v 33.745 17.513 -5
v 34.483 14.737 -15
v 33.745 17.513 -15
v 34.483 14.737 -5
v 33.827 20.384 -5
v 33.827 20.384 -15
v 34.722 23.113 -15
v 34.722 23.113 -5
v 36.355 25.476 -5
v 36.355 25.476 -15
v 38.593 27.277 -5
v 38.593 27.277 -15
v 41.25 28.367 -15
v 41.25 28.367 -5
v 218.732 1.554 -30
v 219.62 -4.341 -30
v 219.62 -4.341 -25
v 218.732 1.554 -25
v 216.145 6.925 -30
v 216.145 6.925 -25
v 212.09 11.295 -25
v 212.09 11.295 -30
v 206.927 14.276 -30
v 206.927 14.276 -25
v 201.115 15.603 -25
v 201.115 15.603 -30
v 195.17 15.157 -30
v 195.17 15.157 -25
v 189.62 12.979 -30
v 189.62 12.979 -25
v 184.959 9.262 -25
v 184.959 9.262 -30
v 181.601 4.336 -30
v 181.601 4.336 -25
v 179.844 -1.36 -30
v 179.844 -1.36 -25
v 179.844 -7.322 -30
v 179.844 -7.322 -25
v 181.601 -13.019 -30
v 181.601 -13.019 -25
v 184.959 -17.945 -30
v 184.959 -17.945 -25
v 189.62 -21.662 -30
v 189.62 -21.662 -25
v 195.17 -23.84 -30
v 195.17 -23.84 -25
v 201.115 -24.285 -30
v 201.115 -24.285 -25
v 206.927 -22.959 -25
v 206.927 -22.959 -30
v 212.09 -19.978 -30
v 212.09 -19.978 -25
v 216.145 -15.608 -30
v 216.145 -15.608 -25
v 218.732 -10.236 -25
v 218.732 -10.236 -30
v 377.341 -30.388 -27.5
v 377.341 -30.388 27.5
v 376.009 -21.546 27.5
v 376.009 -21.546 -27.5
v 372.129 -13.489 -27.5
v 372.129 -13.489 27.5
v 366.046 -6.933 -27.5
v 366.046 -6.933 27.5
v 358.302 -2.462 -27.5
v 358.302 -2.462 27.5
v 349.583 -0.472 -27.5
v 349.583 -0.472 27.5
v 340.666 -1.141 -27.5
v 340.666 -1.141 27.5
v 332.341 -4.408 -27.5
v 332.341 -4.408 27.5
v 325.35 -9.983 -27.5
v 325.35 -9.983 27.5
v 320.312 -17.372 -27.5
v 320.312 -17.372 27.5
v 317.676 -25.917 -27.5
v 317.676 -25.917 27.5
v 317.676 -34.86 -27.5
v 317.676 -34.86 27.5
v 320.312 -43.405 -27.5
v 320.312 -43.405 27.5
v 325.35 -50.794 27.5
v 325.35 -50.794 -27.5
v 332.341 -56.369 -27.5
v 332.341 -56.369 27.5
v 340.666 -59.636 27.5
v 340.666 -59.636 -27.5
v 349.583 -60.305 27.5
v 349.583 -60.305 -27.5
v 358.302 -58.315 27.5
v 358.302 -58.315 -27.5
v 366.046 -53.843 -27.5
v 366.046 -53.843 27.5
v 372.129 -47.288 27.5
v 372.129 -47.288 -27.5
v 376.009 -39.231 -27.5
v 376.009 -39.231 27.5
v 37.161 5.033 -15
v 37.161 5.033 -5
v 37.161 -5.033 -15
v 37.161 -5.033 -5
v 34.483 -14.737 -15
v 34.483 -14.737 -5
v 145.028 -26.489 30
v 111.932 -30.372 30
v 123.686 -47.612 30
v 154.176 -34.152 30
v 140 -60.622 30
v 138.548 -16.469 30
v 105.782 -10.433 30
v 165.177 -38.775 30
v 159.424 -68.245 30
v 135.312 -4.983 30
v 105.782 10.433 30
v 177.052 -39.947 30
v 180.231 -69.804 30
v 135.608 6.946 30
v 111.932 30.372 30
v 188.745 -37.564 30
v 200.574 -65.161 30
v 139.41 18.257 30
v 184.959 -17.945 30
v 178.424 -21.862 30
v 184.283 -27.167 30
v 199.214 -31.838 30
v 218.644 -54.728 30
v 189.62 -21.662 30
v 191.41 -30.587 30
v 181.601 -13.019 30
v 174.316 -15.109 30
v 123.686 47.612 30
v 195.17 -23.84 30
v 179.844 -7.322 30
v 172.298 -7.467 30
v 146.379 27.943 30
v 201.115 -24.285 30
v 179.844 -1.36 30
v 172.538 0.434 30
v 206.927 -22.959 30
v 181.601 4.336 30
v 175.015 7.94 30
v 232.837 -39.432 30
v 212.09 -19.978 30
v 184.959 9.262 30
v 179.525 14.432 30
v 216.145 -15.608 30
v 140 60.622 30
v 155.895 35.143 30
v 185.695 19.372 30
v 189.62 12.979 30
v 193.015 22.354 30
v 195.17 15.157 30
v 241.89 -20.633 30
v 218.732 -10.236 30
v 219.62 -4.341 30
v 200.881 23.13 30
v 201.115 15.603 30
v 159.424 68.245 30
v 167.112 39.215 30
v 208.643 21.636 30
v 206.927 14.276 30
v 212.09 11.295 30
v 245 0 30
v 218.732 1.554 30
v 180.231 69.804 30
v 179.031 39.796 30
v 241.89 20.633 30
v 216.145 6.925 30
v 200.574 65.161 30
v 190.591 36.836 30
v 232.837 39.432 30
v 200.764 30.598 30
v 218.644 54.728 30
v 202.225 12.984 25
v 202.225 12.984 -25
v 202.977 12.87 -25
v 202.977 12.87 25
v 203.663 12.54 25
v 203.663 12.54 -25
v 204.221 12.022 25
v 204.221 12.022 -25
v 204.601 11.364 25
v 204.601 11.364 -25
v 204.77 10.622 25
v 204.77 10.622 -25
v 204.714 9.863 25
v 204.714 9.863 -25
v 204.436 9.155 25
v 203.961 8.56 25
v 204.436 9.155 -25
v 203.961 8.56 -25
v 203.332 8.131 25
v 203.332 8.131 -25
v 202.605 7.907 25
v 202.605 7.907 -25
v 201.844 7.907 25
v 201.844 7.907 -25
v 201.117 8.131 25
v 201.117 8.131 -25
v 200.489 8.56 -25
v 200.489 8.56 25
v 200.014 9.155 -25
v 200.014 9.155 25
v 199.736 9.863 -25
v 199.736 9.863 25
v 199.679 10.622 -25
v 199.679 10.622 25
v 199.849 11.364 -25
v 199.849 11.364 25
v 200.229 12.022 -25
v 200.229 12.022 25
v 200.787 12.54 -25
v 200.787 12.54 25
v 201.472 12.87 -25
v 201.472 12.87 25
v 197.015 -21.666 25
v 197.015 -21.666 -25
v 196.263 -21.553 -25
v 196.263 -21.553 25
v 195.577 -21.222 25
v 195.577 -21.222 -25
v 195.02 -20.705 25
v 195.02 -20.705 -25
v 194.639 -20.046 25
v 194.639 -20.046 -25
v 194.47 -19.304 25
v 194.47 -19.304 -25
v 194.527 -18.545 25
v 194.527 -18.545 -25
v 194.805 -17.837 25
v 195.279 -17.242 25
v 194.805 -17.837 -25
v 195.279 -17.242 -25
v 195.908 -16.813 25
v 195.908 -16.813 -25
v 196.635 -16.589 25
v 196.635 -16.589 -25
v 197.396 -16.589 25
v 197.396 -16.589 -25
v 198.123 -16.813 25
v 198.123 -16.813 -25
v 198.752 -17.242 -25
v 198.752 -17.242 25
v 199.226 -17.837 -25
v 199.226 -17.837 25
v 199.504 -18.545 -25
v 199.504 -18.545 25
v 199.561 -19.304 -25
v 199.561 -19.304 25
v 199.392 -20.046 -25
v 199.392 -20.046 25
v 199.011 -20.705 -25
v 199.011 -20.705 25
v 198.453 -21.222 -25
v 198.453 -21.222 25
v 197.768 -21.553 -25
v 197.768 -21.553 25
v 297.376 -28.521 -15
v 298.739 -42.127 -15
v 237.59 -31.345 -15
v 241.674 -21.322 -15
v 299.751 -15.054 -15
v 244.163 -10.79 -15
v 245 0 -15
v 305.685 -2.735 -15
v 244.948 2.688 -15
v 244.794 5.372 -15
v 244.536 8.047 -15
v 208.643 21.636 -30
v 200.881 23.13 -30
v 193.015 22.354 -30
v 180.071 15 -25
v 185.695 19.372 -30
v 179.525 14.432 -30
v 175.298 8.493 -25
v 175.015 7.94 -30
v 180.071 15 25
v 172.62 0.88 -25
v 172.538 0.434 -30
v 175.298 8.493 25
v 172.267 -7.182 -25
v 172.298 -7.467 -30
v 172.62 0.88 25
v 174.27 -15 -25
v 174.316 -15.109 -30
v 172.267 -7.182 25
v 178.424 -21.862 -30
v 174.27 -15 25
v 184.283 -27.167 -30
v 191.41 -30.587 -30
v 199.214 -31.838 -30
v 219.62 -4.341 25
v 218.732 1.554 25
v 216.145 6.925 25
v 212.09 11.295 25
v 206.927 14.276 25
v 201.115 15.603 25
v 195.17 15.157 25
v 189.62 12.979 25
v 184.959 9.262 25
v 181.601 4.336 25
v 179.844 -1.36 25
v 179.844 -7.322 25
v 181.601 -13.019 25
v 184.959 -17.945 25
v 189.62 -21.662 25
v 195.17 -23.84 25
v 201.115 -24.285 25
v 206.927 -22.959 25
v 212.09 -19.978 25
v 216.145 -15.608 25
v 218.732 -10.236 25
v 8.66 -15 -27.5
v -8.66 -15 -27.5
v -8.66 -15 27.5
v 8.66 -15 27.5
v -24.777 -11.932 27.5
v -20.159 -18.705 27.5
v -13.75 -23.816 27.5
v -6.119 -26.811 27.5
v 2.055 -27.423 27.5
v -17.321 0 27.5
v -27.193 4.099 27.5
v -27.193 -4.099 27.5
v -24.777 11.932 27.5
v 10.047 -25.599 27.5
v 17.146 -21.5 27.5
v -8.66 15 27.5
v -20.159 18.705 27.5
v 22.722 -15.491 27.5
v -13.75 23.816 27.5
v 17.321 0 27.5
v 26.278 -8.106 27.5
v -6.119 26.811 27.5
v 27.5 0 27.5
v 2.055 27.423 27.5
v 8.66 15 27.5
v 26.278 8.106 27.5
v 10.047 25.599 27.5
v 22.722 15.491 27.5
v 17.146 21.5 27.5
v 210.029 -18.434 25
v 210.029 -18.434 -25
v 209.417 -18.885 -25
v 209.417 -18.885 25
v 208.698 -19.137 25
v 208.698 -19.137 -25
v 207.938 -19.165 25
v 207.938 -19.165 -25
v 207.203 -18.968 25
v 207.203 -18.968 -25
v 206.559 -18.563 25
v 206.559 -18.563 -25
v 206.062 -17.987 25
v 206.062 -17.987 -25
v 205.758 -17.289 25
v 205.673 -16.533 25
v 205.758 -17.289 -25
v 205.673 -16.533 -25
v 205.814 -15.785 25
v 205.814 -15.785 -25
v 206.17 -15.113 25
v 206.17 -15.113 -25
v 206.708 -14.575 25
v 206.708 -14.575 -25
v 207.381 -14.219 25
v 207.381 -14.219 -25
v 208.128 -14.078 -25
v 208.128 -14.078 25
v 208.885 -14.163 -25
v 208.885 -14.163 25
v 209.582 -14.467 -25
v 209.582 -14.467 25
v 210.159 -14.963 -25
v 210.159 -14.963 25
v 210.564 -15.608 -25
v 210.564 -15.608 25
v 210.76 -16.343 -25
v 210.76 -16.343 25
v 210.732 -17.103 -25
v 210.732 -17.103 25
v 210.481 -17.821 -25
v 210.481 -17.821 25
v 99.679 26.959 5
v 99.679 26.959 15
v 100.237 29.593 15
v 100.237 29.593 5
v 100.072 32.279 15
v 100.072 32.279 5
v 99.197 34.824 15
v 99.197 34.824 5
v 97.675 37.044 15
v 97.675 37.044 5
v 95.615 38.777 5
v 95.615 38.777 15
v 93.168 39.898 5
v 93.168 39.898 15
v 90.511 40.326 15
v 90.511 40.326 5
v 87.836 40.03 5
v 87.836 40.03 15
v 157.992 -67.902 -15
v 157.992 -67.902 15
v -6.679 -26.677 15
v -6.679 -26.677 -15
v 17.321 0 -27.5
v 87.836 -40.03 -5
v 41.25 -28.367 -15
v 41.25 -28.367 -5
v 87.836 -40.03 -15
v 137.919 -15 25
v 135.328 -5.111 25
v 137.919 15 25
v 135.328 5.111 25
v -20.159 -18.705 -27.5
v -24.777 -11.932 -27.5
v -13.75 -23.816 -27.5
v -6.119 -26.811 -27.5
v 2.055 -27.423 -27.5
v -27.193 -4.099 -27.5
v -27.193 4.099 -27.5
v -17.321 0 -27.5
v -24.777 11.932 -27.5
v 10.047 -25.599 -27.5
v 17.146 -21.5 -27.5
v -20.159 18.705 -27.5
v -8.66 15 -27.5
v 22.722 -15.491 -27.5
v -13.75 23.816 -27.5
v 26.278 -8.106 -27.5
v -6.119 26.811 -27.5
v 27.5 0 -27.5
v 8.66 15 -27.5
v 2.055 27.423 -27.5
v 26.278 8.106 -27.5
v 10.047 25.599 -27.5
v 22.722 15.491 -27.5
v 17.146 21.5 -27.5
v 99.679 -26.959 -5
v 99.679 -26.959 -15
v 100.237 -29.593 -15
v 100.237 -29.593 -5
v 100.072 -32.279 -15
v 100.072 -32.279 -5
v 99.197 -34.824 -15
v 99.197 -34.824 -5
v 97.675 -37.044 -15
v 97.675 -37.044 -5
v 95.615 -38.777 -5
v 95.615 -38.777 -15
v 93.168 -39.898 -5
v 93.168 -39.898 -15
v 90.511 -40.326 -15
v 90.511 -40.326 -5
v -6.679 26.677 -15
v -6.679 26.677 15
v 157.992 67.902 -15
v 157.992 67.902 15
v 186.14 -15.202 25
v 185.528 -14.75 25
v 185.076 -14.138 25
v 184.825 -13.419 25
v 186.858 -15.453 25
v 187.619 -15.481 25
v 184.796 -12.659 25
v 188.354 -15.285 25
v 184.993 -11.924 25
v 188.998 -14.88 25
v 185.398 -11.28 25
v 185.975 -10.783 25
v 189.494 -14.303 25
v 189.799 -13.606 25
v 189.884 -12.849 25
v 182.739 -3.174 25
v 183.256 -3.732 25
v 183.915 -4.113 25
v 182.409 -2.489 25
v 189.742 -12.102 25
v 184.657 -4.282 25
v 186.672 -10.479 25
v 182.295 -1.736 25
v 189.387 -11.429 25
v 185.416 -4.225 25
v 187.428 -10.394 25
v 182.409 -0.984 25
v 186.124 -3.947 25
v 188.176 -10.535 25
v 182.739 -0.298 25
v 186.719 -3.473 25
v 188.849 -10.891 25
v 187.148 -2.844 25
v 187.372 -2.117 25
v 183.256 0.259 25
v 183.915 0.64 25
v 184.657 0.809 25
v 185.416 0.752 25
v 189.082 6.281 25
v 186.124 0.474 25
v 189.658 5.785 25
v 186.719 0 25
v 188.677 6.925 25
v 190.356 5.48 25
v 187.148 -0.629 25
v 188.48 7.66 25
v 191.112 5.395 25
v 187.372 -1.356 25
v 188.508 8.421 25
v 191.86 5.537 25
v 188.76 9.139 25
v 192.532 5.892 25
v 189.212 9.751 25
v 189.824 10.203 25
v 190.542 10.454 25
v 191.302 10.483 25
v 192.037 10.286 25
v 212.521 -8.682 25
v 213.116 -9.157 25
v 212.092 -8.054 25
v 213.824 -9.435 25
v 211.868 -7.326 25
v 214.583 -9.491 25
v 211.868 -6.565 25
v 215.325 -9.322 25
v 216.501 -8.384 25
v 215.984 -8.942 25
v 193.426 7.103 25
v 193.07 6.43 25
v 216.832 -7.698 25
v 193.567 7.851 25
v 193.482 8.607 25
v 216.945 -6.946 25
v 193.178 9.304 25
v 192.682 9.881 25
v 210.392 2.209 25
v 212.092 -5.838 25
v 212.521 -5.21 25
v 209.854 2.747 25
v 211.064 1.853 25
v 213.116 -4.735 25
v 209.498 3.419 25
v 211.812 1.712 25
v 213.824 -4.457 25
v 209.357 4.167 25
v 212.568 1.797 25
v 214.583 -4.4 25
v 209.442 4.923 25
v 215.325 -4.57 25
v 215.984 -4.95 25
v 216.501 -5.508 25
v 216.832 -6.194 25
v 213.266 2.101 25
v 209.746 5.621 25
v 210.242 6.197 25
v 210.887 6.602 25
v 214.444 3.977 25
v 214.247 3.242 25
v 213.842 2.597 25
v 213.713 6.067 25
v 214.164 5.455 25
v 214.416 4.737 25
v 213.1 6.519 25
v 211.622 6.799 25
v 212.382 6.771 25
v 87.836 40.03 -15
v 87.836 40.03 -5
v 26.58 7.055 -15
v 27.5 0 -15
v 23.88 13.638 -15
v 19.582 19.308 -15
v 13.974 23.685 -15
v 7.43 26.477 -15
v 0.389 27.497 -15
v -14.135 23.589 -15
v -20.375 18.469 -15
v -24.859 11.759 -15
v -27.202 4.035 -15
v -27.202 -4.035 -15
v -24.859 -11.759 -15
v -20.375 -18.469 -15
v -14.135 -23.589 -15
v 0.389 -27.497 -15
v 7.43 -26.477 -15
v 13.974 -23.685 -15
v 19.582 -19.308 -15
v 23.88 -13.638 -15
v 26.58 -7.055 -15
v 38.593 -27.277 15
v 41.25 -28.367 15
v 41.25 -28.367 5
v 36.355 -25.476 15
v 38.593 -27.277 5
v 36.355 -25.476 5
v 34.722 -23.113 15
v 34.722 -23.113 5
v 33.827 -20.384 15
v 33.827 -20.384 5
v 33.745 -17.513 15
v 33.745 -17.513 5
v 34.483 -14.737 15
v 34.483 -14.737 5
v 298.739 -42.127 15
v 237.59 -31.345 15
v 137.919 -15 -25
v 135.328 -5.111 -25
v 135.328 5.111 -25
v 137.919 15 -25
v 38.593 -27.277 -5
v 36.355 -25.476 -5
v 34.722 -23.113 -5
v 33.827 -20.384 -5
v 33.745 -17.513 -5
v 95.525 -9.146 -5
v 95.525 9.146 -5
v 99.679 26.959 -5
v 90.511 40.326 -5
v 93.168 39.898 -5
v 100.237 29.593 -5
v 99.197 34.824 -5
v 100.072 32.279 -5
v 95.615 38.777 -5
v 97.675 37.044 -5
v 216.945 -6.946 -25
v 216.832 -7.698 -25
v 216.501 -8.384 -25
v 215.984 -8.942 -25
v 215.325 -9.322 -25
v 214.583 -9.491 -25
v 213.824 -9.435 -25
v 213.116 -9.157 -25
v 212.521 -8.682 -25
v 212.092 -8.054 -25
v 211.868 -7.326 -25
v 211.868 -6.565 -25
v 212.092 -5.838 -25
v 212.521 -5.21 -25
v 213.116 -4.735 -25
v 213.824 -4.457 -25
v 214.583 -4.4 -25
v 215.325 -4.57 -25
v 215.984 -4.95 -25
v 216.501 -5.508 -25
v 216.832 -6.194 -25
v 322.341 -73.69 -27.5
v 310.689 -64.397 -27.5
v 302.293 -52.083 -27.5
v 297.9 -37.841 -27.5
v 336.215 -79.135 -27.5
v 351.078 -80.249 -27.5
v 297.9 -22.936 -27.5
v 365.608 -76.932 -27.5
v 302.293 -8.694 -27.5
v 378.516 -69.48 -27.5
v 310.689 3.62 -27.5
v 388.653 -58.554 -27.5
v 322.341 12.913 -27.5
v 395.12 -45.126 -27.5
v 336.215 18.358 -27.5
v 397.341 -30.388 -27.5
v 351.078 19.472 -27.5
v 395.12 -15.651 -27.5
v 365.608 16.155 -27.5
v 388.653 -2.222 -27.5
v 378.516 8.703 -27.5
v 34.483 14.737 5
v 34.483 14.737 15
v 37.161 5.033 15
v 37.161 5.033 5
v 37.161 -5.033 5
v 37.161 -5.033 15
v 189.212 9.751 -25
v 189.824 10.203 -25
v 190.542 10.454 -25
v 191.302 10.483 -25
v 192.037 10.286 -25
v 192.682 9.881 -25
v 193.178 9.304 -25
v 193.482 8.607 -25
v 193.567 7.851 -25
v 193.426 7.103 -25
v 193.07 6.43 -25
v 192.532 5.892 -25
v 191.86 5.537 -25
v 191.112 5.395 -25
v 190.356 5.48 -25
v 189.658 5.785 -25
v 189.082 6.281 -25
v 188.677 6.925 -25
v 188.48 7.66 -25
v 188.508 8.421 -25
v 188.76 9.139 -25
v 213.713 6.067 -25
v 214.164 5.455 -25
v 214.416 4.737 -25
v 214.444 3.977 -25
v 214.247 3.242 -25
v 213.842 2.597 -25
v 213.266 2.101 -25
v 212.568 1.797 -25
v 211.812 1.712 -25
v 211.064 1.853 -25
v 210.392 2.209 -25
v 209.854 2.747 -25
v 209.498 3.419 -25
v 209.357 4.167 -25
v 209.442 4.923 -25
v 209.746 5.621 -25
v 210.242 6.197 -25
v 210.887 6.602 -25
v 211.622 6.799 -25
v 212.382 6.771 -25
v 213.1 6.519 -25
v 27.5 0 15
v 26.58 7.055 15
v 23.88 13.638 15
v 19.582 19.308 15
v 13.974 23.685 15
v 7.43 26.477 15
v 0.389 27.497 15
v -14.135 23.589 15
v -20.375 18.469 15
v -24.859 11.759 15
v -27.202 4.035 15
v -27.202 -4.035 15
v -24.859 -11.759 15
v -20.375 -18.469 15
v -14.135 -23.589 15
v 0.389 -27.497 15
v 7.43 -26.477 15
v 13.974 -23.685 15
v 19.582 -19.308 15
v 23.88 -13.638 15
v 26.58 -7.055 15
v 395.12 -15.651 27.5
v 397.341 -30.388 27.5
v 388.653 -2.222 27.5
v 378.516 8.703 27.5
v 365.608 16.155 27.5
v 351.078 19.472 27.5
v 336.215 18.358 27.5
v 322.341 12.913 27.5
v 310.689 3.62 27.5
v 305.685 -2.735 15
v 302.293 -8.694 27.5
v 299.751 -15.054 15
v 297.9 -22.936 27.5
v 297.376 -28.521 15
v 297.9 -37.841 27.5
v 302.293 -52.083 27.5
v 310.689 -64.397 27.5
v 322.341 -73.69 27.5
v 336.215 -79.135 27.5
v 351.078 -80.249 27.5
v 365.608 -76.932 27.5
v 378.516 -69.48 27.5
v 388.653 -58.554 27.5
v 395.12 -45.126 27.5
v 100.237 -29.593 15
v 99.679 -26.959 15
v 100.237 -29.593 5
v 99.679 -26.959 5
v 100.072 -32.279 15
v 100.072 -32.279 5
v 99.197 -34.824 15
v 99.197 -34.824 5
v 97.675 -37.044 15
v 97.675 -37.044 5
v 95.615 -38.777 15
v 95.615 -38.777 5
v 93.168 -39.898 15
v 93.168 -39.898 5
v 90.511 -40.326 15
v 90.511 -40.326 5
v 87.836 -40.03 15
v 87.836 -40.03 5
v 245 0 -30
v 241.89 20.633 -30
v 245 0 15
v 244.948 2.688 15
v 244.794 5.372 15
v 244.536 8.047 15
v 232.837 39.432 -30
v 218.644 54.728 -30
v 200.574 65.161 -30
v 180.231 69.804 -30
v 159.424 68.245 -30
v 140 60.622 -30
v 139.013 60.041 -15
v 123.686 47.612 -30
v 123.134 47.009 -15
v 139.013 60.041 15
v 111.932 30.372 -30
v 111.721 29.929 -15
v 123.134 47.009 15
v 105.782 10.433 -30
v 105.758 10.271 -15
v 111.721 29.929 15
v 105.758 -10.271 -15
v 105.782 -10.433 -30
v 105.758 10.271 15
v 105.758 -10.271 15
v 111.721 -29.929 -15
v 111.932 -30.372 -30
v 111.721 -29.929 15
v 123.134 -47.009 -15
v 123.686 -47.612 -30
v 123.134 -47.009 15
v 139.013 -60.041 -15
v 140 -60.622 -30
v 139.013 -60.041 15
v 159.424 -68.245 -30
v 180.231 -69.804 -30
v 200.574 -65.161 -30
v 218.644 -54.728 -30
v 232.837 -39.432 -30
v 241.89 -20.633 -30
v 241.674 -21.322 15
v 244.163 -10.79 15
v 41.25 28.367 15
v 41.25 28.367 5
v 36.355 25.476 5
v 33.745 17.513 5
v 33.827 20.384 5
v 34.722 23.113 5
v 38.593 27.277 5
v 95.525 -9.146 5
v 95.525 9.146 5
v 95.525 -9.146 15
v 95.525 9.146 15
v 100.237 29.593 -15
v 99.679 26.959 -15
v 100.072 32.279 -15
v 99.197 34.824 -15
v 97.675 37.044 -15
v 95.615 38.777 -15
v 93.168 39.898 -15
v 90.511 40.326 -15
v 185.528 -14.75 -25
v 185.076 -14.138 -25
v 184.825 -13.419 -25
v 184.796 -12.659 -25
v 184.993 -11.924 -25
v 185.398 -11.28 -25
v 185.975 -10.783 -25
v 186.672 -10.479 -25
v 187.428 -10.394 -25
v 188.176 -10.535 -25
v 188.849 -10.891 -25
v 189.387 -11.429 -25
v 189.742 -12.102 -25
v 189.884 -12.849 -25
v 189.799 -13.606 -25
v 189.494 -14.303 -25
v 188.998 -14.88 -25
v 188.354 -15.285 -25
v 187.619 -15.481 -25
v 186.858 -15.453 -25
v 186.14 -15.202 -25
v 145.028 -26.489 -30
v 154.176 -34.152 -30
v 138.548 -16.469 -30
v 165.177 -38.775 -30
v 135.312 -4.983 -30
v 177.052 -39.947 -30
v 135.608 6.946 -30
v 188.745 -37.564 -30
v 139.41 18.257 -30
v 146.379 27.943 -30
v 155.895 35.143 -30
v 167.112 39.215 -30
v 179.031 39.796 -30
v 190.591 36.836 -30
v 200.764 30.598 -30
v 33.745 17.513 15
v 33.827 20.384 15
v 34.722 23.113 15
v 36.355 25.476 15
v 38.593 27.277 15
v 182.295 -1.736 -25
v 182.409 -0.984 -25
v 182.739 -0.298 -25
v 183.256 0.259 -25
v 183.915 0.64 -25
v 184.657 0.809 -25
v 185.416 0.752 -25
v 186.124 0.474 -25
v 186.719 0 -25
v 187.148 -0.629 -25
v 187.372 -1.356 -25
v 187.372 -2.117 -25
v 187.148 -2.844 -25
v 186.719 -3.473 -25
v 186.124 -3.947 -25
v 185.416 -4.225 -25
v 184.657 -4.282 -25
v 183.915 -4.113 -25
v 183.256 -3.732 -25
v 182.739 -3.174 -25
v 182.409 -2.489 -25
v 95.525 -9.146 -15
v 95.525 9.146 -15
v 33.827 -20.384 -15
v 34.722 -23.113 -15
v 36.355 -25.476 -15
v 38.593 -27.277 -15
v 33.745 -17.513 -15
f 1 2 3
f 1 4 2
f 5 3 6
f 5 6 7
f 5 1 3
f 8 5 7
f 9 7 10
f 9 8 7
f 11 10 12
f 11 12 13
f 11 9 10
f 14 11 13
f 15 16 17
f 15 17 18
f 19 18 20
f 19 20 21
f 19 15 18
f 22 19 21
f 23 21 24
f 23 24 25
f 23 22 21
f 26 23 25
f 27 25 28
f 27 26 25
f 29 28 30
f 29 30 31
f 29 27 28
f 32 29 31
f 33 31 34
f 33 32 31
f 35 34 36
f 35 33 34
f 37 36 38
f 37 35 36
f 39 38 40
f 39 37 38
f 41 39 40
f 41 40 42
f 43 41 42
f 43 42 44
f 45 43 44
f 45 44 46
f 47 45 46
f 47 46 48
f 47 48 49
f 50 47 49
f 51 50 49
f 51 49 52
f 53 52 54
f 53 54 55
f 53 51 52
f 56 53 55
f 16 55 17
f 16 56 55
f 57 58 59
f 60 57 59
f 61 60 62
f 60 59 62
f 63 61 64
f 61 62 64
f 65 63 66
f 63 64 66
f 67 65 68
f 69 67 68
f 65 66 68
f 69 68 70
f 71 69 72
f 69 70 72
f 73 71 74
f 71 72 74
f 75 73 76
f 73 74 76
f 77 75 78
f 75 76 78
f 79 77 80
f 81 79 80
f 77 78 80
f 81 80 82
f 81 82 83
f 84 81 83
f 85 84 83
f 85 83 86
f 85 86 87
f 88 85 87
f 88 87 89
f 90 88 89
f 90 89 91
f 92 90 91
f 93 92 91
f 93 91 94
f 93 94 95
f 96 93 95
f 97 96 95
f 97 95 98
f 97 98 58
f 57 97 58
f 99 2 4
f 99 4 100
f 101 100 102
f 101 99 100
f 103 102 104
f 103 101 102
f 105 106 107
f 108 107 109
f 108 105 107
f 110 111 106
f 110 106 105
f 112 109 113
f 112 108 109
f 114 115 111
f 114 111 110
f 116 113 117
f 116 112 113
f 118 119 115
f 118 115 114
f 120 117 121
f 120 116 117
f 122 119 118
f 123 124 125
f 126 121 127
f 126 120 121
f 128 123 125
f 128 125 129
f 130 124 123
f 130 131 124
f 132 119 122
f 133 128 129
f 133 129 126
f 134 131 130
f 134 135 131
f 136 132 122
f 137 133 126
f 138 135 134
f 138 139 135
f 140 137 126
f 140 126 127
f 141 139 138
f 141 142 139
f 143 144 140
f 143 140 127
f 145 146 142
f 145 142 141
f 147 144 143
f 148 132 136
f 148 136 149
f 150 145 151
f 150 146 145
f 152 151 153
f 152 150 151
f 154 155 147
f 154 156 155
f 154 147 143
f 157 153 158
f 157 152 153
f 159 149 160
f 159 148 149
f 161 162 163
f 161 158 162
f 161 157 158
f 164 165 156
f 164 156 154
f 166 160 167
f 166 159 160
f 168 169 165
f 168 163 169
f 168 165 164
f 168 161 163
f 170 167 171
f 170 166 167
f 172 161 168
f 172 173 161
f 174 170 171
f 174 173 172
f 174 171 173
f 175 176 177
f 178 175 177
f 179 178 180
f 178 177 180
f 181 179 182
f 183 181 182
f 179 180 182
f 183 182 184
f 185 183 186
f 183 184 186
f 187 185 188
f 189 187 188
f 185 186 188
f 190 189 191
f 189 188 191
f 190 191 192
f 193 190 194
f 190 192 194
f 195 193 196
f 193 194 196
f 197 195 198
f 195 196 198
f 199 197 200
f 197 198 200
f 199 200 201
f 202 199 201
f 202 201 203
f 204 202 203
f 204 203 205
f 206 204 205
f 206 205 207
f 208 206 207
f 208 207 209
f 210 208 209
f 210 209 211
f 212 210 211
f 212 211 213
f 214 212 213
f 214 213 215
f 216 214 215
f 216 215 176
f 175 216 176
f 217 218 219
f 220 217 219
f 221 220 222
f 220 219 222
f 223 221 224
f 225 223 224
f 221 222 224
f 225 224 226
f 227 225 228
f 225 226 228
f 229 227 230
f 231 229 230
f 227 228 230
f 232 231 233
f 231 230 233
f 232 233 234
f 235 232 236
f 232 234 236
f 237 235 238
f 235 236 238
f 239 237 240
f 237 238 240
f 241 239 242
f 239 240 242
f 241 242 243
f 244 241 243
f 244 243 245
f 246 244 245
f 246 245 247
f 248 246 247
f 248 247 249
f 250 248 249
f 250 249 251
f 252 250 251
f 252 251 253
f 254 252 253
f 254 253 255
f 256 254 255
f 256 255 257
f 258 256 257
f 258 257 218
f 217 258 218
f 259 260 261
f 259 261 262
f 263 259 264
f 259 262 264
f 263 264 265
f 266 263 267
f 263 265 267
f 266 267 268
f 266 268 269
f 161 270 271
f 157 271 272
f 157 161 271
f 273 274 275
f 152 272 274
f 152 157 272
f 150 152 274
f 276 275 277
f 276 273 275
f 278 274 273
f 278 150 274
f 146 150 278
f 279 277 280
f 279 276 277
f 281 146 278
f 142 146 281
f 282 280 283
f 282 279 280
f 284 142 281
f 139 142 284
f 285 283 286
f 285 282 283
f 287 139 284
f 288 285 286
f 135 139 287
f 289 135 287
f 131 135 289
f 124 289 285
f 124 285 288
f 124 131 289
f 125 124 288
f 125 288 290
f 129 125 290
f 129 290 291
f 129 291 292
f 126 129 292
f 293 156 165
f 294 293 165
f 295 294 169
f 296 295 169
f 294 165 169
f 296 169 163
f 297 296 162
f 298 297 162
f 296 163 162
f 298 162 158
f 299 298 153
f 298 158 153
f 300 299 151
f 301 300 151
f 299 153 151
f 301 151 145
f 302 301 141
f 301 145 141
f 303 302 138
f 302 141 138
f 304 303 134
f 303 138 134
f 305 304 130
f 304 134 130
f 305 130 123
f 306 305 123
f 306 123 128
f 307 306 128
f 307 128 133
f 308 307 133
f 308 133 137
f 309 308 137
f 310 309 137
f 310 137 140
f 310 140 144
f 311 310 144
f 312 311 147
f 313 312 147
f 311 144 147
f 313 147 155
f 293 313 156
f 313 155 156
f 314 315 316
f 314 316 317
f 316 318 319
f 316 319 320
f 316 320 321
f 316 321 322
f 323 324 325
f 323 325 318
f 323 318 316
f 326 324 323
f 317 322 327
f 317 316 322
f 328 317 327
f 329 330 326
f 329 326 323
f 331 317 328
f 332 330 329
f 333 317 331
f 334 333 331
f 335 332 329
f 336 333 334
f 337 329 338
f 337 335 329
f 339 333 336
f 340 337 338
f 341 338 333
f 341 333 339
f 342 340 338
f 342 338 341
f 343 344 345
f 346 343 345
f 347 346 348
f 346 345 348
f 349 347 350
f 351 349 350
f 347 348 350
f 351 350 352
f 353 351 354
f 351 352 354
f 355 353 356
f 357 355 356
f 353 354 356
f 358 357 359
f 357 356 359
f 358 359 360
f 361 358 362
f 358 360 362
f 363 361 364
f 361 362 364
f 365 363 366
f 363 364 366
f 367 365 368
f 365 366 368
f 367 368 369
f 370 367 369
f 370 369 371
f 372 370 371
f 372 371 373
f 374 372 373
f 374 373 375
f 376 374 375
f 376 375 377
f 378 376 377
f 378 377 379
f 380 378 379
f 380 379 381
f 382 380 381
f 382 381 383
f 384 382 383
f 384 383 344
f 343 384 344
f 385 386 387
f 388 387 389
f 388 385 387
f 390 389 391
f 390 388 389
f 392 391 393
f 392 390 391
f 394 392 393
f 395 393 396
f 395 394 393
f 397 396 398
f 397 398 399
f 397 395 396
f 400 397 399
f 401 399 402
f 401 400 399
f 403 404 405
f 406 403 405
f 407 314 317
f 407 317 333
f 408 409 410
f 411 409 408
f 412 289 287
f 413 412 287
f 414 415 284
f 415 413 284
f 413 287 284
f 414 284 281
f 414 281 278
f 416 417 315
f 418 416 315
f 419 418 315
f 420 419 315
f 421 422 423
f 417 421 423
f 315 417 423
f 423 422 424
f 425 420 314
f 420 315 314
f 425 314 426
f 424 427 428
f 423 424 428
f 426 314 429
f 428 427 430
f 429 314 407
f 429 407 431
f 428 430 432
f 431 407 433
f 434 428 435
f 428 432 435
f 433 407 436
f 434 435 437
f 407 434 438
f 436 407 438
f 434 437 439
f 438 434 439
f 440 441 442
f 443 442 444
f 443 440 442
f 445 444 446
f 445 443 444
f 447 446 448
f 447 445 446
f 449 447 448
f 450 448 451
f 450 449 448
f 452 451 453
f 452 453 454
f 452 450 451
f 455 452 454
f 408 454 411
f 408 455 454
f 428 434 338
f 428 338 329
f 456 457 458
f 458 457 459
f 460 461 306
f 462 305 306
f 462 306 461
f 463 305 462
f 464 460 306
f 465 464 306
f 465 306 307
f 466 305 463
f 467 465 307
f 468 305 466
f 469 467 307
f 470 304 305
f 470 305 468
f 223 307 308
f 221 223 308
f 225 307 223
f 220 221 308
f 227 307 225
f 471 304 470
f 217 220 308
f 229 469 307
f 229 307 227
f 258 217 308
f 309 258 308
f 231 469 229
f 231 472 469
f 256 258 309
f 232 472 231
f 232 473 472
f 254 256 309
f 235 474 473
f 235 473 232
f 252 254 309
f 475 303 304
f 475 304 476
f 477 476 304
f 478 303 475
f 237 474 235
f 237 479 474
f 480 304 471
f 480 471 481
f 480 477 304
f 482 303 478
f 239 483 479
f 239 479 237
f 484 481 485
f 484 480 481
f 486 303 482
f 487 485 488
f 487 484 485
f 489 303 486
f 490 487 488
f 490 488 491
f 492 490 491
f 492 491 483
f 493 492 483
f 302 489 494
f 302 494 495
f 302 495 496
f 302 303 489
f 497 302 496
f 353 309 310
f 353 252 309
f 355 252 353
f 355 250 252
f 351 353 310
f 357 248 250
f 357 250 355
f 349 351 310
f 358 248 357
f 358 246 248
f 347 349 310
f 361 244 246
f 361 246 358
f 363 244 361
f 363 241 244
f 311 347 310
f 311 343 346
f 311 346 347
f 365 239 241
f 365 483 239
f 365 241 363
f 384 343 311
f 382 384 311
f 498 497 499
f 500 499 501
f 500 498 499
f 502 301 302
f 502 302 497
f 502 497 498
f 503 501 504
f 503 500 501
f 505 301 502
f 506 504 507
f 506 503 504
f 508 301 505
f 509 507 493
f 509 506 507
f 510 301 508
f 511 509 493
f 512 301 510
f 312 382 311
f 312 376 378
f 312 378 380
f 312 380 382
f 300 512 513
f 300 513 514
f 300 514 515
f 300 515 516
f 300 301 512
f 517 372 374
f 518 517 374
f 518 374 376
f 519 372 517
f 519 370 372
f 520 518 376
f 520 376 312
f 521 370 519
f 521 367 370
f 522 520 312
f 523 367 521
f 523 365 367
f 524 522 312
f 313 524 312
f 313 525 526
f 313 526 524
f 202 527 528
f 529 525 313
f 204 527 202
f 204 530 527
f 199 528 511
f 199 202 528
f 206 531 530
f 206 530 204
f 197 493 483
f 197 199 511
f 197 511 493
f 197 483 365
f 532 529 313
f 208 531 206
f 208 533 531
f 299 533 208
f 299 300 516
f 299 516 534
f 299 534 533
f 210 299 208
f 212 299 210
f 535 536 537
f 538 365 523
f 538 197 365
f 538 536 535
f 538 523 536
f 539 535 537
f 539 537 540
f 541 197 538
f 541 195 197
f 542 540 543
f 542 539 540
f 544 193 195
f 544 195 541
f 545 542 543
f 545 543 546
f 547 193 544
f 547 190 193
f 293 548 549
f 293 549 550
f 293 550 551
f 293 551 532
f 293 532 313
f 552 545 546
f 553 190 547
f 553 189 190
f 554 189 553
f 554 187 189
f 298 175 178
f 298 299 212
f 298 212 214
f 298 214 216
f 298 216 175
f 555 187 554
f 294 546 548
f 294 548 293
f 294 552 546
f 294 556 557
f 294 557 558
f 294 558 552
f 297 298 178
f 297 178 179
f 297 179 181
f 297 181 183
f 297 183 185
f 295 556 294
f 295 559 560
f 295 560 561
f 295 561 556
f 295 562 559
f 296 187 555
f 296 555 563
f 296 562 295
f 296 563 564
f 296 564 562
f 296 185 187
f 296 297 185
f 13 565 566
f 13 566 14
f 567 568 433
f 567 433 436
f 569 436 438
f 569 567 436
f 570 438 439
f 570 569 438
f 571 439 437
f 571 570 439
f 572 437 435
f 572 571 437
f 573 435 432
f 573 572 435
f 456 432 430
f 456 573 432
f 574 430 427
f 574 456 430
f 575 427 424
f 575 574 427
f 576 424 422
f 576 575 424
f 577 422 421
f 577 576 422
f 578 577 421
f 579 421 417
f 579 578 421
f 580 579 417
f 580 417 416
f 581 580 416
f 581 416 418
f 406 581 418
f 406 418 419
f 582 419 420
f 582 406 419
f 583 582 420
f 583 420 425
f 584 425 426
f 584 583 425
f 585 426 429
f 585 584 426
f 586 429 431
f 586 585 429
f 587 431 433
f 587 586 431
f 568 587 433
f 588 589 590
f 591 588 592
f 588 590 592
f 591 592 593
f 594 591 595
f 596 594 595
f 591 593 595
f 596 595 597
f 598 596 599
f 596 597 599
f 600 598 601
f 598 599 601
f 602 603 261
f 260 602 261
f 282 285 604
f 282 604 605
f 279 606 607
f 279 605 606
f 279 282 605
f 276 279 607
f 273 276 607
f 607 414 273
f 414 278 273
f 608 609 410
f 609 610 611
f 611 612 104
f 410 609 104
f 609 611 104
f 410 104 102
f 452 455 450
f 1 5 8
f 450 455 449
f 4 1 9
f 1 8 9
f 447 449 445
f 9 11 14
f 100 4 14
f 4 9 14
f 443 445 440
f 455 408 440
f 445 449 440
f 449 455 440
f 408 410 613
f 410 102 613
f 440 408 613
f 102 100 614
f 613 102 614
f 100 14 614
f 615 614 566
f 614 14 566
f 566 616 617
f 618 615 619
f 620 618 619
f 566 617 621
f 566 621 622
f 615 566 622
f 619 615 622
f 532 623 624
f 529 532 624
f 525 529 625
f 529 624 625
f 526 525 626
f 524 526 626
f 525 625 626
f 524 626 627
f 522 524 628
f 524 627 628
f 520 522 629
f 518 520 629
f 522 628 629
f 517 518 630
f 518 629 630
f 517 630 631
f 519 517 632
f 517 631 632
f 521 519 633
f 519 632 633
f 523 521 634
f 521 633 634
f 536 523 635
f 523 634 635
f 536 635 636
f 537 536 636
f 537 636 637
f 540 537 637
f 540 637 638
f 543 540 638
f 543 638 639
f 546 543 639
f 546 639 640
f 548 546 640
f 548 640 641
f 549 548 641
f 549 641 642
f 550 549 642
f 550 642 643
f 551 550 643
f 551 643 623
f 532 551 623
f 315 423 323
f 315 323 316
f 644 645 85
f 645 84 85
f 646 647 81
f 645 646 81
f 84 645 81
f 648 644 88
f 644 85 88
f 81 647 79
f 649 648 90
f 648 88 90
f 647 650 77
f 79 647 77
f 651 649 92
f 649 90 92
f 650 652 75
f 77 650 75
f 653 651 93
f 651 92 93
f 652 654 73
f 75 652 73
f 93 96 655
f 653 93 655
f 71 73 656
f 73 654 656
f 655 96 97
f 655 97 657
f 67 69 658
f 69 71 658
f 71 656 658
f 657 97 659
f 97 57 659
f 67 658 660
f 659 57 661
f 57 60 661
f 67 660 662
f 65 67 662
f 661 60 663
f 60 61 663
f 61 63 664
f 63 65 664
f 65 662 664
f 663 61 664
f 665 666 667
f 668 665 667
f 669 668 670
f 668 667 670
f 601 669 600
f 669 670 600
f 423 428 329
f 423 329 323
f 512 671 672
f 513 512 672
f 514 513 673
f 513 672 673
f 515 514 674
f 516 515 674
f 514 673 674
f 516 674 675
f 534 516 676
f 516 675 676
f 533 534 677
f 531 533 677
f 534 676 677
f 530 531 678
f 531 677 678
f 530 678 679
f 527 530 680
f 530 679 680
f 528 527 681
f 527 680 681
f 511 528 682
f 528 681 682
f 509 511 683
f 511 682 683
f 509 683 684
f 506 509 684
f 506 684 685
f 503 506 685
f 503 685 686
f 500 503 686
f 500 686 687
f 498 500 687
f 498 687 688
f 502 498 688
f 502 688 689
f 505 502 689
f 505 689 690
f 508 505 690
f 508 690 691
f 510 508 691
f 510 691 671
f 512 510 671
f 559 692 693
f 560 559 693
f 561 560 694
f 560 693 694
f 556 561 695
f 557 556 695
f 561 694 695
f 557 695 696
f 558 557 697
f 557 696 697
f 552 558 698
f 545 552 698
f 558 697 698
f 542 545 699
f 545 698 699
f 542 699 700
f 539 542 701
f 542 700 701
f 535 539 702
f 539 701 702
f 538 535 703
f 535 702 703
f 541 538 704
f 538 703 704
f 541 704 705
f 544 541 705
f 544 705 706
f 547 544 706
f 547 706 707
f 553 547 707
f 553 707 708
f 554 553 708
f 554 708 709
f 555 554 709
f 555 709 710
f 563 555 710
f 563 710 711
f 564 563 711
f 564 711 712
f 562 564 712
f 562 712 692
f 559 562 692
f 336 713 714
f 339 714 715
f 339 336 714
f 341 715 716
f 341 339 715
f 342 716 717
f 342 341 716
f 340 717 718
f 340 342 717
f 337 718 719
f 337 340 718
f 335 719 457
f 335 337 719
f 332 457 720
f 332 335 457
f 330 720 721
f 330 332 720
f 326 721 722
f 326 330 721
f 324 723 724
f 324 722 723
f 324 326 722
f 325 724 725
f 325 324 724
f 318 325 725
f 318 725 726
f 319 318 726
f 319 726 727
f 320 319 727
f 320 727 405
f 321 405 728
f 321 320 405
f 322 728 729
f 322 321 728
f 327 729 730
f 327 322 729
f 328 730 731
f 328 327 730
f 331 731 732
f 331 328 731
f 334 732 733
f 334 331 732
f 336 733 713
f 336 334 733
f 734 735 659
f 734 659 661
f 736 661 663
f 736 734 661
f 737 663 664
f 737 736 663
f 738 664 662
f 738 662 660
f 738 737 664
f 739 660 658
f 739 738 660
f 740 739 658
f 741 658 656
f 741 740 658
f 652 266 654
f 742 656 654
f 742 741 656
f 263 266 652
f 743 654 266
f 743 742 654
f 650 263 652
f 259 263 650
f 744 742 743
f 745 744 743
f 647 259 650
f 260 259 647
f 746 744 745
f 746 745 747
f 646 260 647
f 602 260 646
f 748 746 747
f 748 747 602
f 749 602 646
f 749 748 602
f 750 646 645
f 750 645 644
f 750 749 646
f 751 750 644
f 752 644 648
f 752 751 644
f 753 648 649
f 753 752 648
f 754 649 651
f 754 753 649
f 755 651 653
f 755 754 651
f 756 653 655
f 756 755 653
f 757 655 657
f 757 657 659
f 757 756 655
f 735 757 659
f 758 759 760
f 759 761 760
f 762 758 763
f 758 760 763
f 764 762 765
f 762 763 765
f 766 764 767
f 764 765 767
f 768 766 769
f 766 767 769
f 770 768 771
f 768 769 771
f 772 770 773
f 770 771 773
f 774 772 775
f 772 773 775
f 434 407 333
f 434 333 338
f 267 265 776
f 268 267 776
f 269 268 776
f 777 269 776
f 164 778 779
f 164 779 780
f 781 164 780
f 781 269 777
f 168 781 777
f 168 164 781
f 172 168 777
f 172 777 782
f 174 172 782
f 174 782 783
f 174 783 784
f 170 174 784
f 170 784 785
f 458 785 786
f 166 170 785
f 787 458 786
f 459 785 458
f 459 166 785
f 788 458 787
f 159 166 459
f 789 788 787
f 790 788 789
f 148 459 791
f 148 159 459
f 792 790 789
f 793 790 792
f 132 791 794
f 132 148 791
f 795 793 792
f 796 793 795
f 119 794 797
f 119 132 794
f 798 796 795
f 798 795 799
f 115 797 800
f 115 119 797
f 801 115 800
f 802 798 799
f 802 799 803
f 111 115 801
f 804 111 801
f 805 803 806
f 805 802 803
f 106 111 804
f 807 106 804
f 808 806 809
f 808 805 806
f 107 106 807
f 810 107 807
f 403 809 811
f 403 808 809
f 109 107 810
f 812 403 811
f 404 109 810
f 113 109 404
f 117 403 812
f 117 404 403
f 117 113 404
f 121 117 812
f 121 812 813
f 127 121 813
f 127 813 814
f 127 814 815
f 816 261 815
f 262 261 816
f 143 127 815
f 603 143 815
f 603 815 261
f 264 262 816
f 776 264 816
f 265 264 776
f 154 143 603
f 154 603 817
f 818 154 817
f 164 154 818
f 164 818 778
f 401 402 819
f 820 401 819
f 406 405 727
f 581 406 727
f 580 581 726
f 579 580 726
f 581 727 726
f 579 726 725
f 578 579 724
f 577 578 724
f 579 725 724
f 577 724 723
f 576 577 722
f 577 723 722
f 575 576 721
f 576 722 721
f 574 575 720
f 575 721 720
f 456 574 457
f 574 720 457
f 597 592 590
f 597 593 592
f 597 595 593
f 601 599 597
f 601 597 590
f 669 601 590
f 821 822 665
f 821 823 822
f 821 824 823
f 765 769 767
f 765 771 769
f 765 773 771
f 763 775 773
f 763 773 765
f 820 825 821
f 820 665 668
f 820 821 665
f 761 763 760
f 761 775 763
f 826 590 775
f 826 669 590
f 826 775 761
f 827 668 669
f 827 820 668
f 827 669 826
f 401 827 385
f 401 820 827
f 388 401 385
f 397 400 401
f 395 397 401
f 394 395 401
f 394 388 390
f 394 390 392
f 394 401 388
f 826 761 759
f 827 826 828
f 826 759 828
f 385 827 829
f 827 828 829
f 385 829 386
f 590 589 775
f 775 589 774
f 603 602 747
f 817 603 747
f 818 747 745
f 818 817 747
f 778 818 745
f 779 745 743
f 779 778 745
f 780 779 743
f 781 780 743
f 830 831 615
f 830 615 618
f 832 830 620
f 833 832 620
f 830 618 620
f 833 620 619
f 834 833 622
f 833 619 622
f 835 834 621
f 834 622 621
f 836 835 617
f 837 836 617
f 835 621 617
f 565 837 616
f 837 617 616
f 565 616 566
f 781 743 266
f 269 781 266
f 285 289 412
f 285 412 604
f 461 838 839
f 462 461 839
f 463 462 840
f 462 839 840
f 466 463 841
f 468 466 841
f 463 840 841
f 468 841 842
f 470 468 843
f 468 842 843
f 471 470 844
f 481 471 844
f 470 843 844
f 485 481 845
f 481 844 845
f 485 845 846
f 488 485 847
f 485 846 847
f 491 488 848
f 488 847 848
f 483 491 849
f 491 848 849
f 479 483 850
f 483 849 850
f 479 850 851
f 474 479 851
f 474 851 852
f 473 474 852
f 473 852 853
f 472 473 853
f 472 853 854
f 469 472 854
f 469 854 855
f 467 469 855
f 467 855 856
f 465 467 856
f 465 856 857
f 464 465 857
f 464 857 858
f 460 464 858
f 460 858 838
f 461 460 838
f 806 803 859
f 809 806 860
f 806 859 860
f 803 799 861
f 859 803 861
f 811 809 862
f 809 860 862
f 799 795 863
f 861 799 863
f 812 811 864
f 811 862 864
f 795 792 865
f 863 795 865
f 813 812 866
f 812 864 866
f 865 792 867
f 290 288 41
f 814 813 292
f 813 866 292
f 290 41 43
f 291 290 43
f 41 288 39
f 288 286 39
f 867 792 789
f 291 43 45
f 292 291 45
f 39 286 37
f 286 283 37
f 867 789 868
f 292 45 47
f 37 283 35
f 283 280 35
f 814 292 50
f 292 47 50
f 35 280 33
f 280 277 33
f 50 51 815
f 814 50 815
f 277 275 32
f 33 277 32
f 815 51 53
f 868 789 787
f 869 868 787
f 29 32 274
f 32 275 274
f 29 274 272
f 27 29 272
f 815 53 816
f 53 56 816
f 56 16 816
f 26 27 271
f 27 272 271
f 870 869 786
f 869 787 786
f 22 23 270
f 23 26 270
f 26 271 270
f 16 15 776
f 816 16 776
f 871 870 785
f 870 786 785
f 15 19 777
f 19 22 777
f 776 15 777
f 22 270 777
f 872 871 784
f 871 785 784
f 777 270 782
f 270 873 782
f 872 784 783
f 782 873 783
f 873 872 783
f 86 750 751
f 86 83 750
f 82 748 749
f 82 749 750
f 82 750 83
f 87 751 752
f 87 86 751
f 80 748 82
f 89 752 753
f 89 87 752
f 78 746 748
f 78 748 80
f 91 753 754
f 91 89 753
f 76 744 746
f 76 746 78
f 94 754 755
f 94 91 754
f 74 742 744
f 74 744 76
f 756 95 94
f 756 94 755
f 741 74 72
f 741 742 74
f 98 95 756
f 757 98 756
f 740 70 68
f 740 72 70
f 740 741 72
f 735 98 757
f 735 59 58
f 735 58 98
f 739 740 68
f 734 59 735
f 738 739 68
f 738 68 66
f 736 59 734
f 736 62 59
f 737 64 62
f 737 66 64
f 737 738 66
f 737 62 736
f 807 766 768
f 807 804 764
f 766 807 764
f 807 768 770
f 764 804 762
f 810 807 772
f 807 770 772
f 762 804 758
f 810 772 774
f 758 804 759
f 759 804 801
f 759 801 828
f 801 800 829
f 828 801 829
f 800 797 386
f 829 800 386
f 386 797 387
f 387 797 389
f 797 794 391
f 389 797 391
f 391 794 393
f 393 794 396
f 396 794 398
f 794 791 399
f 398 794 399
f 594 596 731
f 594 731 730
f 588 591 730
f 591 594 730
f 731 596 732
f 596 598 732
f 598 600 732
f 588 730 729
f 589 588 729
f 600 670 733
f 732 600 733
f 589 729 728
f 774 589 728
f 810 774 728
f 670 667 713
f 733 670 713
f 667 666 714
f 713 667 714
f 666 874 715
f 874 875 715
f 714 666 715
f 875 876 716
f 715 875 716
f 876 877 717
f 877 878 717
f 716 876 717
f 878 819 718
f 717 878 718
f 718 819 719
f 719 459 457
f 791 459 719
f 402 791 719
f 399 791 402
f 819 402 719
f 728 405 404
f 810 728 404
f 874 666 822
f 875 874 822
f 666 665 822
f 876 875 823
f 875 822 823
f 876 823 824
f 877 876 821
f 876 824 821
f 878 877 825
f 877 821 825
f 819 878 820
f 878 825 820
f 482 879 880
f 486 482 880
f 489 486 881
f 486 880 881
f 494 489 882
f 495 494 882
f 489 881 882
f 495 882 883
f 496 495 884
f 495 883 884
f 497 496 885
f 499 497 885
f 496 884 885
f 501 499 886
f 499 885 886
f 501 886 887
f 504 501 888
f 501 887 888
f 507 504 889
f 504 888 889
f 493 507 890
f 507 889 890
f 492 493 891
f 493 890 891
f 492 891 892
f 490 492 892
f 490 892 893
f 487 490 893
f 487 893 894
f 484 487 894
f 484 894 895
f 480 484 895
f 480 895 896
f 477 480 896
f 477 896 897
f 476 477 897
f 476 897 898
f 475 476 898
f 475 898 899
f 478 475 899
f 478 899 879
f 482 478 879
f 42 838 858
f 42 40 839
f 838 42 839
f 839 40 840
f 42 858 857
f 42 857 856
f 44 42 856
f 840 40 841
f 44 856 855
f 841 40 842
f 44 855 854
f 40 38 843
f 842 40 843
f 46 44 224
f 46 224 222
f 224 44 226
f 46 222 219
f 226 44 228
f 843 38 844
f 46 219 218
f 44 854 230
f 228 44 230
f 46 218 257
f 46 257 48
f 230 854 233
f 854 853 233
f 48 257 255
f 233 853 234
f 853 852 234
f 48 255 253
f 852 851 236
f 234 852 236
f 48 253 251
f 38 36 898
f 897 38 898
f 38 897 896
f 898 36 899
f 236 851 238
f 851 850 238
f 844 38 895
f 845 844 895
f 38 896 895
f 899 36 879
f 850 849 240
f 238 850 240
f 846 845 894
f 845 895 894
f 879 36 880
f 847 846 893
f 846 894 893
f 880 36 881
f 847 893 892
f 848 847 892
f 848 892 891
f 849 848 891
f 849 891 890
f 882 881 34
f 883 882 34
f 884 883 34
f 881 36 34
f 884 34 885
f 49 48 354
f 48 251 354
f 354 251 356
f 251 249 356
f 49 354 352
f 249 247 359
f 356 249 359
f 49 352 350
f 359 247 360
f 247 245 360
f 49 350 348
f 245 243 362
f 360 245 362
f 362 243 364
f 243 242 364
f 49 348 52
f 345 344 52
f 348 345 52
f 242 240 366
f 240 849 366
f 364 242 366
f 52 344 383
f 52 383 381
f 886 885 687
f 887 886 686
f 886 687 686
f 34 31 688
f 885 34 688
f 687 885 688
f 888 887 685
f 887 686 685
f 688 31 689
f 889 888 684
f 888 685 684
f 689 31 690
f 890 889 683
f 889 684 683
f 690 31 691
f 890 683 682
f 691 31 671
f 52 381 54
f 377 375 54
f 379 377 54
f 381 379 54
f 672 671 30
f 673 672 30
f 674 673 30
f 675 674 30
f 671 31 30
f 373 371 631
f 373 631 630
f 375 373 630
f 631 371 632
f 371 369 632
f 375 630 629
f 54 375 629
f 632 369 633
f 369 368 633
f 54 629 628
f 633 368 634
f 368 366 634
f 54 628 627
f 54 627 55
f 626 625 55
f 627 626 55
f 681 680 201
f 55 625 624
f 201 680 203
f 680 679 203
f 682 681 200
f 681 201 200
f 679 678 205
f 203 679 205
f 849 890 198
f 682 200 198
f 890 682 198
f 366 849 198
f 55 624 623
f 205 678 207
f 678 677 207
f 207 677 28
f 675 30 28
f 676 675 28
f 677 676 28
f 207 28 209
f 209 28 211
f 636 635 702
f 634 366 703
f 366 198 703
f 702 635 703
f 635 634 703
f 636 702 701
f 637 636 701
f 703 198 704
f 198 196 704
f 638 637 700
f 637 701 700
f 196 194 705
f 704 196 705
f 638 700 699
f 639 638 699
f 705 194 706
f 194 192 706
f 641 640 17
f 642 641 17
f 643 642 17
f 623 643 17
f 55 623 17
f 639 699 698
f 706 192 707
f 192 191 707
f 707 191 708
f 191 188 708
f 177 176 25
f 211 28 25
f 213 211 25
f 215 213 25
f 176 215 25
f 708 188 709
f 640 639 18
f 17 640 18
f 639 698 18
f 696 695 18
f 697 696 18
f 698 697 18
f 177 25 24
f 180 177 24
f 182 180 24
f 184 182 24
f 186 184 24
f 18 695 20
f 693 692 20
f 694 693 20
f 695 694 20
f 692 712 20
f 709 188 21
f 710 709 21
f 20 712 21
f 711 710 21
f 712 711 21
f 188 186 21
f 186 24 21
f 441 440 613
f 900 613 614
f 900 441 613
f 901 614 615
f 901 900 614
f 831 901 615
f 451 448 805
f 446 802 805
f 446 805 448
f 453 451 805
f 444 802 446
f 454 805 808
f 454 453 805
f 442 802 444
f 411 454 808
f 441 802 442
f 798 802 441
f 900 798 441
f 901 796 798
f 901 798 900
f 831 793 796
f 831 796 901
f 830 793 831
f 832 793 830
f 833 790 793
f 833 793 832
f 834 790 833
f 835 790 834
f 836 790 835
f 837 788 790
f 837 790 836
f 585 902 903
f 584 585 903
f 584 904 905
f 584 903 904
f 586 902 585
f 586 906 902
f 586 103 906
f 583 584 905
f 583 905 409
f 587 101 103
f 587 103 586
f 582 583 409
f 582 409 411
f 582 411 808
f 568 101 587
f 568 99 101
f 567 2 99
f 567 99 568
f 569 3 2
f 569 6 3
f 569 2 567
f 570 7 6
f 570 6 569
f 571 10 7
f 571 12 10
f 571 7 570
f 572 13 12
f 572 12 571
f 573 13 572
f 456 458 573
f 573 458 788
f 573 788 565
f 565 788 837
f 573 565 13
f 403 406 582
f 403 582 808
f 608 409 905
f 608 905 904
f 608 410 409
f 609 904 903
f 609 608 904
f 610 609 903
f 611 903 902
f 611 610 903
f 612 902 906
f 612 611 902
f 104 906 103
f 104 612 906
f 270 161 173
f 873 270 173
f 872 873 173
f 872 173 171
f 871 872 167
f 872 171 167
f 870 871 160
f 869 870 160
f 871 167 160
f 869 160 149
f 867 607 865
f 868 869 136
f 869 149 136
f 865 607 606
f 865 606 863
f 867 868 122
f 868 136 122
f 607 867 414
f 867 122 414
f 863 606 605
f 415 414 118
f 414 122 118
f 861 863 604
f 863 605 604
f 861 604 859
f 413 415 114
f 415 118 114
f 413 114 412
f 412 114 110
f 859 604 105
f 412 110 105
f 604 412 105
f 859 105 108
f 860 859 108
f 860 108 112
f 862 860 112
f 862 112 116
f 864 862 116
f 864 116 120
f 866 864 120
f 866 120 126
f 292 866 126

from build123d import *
from build123d.topology import SkipClean

# Parameters (mm, degrees)
LEFT_ARM_DEPTH                = 15
SKETCH2_R                     = 27.5
LEFT_BOSS_DEPTH               = 27.5
LEFT_HEX_DEPTH                = 261.672208
LEFT_HEX_DEPTH_BACK           = 261.672208
SKETCH3_R                     = 70
CENTRE_BOSS_DEPTH             = 30
SKETCH5_W                     = 30
SKETCH5_H                     = 40
RIGHT_ARM_DEPTH               = 175
SKETCH7_R                     = 50
RIGHT_BOSS_DEPTH              = 27.5
SKETCH8_R                     = 30
RIGHT_BOSS_HOLE_DEPTH         = 410.449269
SKETCH9_R                     = 40
CENTRE_HOLE_DEPTH             = 410.807825
SKETCH10_R                    = 27.5
CENTRE_BLOB_DEPTH             = 30
CENTRE_BEAM_REACH             = 240.323
SKETCH11_W                    = 50
SKETCH11_H                    = 30
CENTRE_BEAM_DIRECTION_2_REACH = 240.323
SKETCH12_R                    = 20
CUT_EXTRUDE4_DEPTH            = 5
F_1_4_20_TAPPED_HOLE1_D       = 5.1054
CIRPATTERN1_COUNT             = 8
CUT_OUT_DEPTH                 = 10
FILLET1_R                     = 10
FILLET1_OF_MIRROR2_R          = 10


with BuildPart() as part:
    # Sketch1 → LEFT_ARM (new, symmetric)
    with BuildSketch(Plane.XY):
        with BuildLine():
            Line((-6.678571, 26.676707), (158, 67.904344))
            ThreePointArc((158, 67.904344), (245, 0), (158, -67.904344))
            Line((158, -67.904344), (-6.678571, -26.676707))
            ThreePointArc((-6.678571, -26.676707), (-27.5, 0), (-6.678571, 26.676707))
        make_face()
    extrude(amount=LEFT_ARM_DEPTH, both=True)

    # Sketch2 → LEFT_Boss (add, symmetric)
    with SkipClean():  # the faces are left unmerged after this step: merging them gives an invalid solid
        with BuildSketch(Plane.XY):
            Circle(SKETCH2_R)
        extrude(amount=LEFT_BOSS_DEPTH, both=True)

    # Sketch4 → LEFT_Hex (cut, two sides: drawn at the far end of the back side and taken through both)
    with SkipClean():  # the faces are left unmerged after this step: merging them gives an invalid solid
        with BuildSketch(Plane.XY.offset(27.5).offset(-LEFT_HEX_DEPTH_BACK)):
            Polygon((17.320508, 0), (8.660254, 15), (-8.660254, 15), (-17.320508, 0), (-8.660254, -15), (8.660254, -15), align=None)
        extrude(amount=LEFT_HEX_DEPTH + LEFT_HEX_DEPTH_BACK, mode=Mode.SUBTRACT)

    # Sketch3 → CENTRE_Boss (add, symmetric)
    with BuildSketch(Plane.XY):
        with Locations((175, 0)):
            Circle(SKETCH3_R)
    extrude(amount=CENTRE_BOSS_DEPTH, both=True)

    # Sketch5 → RIGHT_ARM (add)
    with BuildSketch(Plane(origin=(169.723104, -29.926763, 0), x_dir=(0, 0, -1), z_dir=(0.984807753012208, -0.17364817766693072, 0))):
        with Locations((0, 30.388431)):
            Rectangle(SKETCH5_W, SKETCH5_H)
    extrude(amount=RIGHT_ARM_DEPTH)

    # Sketch7 → RIGHT_Boss (add, symmetric)
    with BuildSketch(Plane.XY):
        with Locations((347.341357, -30.388431)):
            Circle(SKETCH7_R)
    extrude(amount=RIGHT_BOSS_DEPTH, both=True)

    # Sketch8 → RIGHT_Boss_Hole (cut, through all)
    with BuildSketch(Plane.XY.offset(27.5)):
        with Locations((347.341357, -30.388431)):
            Circle(SKETCH8_R)
    extrude(amount=-RIGHT_BOSS_HOLE_DEPTH, mode=Mode.SUBTRACT)

    # Sketch9 → CENTRE_Hole (cut, through all)
    with BuildSketch(Plane.XY.offset(30)):
        with Locations((175, 0)):
            Circle(SKETCH9_R)
    extrude(amount=-CENTRE_HOLE_DEPTH, mode=Mode.SUBTRACT)

    # Sketch10 → CENTRE_Blob (add, symmetric)
    with BuildSketch(Plane.XY):
        with Locations((199.620194, -4.341204)):
            Circle(SKETCH10_R)
    extrude(amount=CENTRE_BLOB_DEPTH, both=True)

    # Sketch11 → CENTRE_Beam (add, up to next)
    with BuildSketch(Plane(origin=(175, 0, 0), x_dir=(0, 0, -1), z_dir=(1, 0, 0)), mode=Mode.PRIVATE) as centre_beam_sk1:
        Rectangle(SKETCH11_W, SKETCH11_H)
    centre_beam_tool1 = extrude(centre_beam_sk1.sketch, amount=CENTRE_BEAM_REACH, mode=Mode.PRIVATE) - part.part
    add(centre_beam_tool1.solids().sort_by_distance((175, 0, 0))[0])

    # Sketch11 → CENTRE_Beam direction 2 (add, up to next)
    with BuildSketch(Plane(origin=(175, 0, 0), x_dir=(0, 0, -1), z_dir=(1, 0, 0)), mode=Mode.PRIVATE) as centre_beam_direction_2_sk1:
        Rectangle(SKETCH11_W, SKETCH11_H)
    centre_beam_direction_2_tool1 = extrude(centre_beam_direction_2_sk1.sketch, amount=-CENTRE_BEAM_DIRECTION_2_REACH, mode=Mode.PRIVATE) - part.part
    add(centre_beam_direction_2_tool1.solids().sort_by_distance((175, 0, 0))[0])

    # Sketch12 → Cut-Extrude4 (cut)
    with BuildSketch(Plane.XY.offset(30)):
        with Locations((199.620194, -4.341204)):
            Circle(SKETCH12_R)
    cut_extrude4 = extrude(amount=-CUT_EXTRUDE4_DEPTH, mode=Mode.SUBTRACT)

    # 1/4-20 Tapped Hole1 (through all)
    with Locations(Plane.XY.offset(25)):
        with Locations((184.848078, -1.736482)):
            f_1_4_20_tapped_hole1 = Hole(F_1_4_20_TAPPED_HOLE1_D / 2)

    # CirPattern1: 1/4-20 Tapped Hole1 ×8 about axis
    cirpattern1_axis = Axis((199.620194, -4.341204, 0), (0, 0, 1))
    for i in range(1, CIRPATTERN1_COUNT):
        add(f_1_4_20_tapped_hole1.rotate(cirpattern1_axis, i * 360 / CIRPATTERN1_COUNT), mode=Mode.SUBTRACT)

    # Mirror1: Cut-Extrude4 across plane
    add(cut_extrude4.mirror(Plane.XY), mode=Mode.SUBTRACT)

    # Sketch15 → Cut_OUT (cut)
    with BuildSketch(Plane.XY.offset(15)):
        with BuildLine():
            Line((109.097712, 45.352932), (27.923319, 25.030746))
            ThreePointArc((27.923319, 25.030746), (37.5, 0), (27.923319, -25.030746))
            Line((27.923319, -25.030746), (109.097712, -45.352932))
            ThreePointArc((109.097712, -45.352932), (95, 0), (109.097712, 45.352932))
        make_face()
    cut_out = extrude(amount=-CUT_OUT_DEPTH, mode=Mode.SUBTRACT)

    # Fillet1
    fillet1_edges = [part.edges().sort_by_distance(p)[0] for p in [
        (27.923319, -25.030746, 10),
        (27.923319, 25.030746, 10),
        (109.097712, 45.352932, 10),
        (109.097712, -45.352932, 10),
    ]]
    fillet(fillet1_edges, radius=FILLET1_R)

    # Mirror2: Cut_OUT across plane
    with SkipClean():  # the faces are left unmerged after this step: merging them gives an invalid solid
        add(cut_out.mirror(Plane.XY), mode=Mode.SUBTRACT)

    # Fillet1 of Mirror2
    fillet1_of_mirror2_edges = [part.edges().sort_by_distance(p)[0] for p in [
        (27.923319, -25.030746, -10),
        (27.923319, 25.030746, -10),
        (109.097712, 45.352932, -10),
        (109.097712, -45.352932, -10),
    ]]
    fillet(fillet1_of_mirror2_edges, radius=FILLET1_OF_MIRROR2_R)


solid = part.part
